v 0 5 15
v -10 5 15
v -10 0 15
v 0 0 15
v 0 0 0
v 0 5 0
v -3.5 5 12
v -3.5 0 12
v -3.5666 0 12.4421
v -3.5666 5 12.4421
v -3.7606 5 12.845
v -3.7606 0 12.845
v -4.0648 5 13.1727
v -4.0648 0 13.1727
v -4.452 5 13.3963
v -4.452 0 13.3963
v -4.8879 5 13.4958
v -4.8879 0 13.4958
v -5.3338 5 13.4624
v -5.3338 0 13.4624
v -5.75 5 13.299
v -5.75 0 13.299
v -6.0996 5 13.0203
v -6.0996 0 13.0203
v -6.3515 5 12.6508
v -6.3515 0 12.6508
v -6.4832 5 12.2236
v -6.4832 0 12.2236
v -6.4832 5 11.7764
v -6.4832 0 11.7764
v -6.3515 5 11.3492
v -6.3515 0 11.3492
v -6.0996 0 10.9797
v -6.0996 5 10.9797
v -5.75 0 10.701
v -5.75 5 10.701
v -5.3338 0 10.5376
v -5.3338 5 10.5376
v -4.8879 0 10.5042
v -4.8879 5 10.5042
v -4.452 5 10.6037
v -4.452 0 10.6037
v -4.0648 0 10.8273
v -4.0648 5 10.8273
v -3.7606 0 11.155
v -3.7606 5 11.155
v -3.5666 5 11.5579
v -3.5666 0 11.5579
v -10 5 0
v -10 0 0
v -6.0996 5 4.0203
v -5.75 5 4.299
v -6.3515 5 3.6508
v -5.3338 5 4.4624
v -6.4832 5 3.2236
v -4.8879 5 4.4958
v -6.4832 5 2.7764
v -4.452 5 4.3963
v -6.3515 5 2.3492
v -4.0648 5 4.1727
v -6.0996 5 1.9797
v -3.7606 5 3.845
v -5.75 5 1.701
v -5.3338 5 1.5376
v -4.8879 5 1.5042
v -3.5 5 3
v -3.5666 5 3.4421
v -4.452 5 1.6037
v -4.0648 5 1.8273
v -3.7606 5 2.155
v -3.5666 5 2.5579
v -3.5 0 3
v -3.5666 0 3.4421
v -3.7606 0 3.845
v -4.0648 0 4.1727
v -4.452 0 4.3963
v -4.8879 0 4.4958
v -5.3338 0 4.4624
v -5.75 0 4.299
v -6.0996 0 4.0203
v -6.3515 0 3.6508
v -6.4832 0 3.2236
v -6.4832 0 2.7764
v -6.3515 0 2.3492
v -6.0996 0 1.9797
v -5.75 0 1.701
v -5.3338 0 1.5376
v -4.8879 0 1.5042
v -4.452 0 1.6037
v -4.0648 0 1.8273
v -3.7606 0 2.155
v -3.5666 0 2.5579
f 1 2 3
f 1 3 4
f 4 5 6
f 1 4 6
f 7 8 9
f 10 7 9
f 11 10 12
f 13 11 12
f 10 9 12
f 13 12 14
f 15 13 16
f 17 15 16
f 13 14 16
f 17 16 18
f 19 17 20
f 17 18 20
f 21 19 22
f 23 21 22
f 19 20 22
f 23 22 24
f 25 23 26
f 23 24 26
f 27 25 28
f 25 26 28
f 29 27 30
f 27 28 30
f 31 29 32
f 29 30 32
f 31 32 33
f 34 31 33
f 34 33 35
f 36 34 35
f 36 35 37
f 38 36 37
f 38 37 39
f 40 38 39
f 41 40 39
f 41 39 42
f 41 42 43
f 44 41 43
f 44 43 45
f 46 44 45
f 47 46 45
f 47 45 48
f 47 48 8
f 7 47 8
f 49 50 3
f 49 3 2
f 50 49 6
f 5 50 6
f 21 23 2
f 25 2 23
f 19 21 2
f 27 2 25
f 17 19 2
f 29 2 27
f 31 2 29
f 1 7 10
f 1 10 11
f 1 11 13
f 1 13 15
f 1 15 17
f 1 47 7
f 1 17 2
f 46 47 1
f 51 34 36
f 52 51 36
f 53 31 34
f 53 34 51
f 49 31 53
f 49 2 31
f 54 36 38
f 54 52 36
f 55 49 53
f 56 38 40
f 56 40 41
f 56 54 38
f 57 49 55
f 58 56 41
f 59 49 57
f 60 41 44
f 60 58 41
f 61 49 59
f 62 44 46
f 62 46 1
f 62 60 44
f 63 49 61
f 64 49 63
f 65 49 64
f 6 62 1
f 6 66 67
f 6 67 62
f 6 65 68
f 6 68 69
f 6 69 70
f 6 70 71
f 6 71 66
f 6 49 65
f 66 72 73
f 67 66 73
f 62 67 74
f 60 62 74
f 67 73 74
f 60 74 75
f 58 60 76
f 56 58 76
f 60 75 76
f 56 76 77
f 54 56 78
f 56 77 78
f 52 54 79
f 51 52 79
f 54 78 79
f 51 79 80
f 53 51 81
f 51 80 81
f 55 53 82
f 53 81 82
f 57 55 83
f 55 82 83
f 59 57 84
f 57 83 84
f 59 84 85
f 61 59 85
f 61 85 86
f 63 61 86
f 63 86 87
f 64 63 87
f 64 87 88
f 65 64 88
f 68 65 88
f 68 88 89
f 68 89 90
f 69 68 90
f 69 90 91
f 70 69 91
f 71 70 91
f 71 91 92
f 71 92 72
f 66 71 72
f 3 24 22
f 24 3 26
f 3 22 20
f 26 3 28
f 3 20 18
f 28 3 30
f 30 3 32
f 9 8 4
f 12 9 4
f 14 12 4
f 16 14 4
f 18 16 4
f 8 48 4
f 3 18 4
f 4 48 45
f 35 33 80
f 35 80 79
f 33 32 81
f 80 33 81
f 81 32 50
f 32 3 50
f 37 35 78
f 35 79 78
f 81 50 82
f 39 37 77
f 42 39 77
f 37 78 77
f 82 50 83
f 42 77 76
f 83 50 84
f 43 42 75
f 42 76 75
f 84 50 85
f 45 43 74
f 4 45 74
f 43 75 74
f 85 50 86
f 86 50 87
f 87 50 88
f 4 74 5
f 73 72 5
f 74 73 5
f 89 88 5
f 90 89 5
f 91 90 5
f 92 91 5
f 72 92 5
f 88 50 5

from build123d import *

# Parameters (mm, degrees)
SCHIZZO1_W                   = 10
SCHIZZO1_H                   = 5
ESTRUSIONE_ESTRUSIONE1_DEPTH = 15
SCHIZZO2_R                   = 1.5
TAGLIO_ESTRUSIONE1_DEPTH     = 19.708286934


with BuildPart() as part:
    # Schizzo1 → Estrusione-Estrusione1 (new body)
    with BuildSketch(Plane.XY):
        with Locations((-5, 2.5)):
            Rectangle(SCHIZZO1_W, SCHIZZO1_H)
    extrude(amount=ESTRUSIONE_ESTRUSIONE1_DEPTH)

    # Schizzo2 → Taglio-Estrusione1 (cut, through all)
    with BuildSketch(Plane(origin=(0, 0, 0), x_dir=(-1, 0, 0), z_dir=(0, -1, 0))):
        with Locations(Location((5, -12, 0), (0, 0, 180))):
            Circle(SCHIZZO2_R)
        with Locations(Location((5, -3, 0), (0, 0, 180))):
            Circle(SCHIZZO2_R)
    extrude(amount=-TAGLIO_ESTRUSIONE1_DEPTH, mode=Mode.SUBTRACT)


solid = part.part
